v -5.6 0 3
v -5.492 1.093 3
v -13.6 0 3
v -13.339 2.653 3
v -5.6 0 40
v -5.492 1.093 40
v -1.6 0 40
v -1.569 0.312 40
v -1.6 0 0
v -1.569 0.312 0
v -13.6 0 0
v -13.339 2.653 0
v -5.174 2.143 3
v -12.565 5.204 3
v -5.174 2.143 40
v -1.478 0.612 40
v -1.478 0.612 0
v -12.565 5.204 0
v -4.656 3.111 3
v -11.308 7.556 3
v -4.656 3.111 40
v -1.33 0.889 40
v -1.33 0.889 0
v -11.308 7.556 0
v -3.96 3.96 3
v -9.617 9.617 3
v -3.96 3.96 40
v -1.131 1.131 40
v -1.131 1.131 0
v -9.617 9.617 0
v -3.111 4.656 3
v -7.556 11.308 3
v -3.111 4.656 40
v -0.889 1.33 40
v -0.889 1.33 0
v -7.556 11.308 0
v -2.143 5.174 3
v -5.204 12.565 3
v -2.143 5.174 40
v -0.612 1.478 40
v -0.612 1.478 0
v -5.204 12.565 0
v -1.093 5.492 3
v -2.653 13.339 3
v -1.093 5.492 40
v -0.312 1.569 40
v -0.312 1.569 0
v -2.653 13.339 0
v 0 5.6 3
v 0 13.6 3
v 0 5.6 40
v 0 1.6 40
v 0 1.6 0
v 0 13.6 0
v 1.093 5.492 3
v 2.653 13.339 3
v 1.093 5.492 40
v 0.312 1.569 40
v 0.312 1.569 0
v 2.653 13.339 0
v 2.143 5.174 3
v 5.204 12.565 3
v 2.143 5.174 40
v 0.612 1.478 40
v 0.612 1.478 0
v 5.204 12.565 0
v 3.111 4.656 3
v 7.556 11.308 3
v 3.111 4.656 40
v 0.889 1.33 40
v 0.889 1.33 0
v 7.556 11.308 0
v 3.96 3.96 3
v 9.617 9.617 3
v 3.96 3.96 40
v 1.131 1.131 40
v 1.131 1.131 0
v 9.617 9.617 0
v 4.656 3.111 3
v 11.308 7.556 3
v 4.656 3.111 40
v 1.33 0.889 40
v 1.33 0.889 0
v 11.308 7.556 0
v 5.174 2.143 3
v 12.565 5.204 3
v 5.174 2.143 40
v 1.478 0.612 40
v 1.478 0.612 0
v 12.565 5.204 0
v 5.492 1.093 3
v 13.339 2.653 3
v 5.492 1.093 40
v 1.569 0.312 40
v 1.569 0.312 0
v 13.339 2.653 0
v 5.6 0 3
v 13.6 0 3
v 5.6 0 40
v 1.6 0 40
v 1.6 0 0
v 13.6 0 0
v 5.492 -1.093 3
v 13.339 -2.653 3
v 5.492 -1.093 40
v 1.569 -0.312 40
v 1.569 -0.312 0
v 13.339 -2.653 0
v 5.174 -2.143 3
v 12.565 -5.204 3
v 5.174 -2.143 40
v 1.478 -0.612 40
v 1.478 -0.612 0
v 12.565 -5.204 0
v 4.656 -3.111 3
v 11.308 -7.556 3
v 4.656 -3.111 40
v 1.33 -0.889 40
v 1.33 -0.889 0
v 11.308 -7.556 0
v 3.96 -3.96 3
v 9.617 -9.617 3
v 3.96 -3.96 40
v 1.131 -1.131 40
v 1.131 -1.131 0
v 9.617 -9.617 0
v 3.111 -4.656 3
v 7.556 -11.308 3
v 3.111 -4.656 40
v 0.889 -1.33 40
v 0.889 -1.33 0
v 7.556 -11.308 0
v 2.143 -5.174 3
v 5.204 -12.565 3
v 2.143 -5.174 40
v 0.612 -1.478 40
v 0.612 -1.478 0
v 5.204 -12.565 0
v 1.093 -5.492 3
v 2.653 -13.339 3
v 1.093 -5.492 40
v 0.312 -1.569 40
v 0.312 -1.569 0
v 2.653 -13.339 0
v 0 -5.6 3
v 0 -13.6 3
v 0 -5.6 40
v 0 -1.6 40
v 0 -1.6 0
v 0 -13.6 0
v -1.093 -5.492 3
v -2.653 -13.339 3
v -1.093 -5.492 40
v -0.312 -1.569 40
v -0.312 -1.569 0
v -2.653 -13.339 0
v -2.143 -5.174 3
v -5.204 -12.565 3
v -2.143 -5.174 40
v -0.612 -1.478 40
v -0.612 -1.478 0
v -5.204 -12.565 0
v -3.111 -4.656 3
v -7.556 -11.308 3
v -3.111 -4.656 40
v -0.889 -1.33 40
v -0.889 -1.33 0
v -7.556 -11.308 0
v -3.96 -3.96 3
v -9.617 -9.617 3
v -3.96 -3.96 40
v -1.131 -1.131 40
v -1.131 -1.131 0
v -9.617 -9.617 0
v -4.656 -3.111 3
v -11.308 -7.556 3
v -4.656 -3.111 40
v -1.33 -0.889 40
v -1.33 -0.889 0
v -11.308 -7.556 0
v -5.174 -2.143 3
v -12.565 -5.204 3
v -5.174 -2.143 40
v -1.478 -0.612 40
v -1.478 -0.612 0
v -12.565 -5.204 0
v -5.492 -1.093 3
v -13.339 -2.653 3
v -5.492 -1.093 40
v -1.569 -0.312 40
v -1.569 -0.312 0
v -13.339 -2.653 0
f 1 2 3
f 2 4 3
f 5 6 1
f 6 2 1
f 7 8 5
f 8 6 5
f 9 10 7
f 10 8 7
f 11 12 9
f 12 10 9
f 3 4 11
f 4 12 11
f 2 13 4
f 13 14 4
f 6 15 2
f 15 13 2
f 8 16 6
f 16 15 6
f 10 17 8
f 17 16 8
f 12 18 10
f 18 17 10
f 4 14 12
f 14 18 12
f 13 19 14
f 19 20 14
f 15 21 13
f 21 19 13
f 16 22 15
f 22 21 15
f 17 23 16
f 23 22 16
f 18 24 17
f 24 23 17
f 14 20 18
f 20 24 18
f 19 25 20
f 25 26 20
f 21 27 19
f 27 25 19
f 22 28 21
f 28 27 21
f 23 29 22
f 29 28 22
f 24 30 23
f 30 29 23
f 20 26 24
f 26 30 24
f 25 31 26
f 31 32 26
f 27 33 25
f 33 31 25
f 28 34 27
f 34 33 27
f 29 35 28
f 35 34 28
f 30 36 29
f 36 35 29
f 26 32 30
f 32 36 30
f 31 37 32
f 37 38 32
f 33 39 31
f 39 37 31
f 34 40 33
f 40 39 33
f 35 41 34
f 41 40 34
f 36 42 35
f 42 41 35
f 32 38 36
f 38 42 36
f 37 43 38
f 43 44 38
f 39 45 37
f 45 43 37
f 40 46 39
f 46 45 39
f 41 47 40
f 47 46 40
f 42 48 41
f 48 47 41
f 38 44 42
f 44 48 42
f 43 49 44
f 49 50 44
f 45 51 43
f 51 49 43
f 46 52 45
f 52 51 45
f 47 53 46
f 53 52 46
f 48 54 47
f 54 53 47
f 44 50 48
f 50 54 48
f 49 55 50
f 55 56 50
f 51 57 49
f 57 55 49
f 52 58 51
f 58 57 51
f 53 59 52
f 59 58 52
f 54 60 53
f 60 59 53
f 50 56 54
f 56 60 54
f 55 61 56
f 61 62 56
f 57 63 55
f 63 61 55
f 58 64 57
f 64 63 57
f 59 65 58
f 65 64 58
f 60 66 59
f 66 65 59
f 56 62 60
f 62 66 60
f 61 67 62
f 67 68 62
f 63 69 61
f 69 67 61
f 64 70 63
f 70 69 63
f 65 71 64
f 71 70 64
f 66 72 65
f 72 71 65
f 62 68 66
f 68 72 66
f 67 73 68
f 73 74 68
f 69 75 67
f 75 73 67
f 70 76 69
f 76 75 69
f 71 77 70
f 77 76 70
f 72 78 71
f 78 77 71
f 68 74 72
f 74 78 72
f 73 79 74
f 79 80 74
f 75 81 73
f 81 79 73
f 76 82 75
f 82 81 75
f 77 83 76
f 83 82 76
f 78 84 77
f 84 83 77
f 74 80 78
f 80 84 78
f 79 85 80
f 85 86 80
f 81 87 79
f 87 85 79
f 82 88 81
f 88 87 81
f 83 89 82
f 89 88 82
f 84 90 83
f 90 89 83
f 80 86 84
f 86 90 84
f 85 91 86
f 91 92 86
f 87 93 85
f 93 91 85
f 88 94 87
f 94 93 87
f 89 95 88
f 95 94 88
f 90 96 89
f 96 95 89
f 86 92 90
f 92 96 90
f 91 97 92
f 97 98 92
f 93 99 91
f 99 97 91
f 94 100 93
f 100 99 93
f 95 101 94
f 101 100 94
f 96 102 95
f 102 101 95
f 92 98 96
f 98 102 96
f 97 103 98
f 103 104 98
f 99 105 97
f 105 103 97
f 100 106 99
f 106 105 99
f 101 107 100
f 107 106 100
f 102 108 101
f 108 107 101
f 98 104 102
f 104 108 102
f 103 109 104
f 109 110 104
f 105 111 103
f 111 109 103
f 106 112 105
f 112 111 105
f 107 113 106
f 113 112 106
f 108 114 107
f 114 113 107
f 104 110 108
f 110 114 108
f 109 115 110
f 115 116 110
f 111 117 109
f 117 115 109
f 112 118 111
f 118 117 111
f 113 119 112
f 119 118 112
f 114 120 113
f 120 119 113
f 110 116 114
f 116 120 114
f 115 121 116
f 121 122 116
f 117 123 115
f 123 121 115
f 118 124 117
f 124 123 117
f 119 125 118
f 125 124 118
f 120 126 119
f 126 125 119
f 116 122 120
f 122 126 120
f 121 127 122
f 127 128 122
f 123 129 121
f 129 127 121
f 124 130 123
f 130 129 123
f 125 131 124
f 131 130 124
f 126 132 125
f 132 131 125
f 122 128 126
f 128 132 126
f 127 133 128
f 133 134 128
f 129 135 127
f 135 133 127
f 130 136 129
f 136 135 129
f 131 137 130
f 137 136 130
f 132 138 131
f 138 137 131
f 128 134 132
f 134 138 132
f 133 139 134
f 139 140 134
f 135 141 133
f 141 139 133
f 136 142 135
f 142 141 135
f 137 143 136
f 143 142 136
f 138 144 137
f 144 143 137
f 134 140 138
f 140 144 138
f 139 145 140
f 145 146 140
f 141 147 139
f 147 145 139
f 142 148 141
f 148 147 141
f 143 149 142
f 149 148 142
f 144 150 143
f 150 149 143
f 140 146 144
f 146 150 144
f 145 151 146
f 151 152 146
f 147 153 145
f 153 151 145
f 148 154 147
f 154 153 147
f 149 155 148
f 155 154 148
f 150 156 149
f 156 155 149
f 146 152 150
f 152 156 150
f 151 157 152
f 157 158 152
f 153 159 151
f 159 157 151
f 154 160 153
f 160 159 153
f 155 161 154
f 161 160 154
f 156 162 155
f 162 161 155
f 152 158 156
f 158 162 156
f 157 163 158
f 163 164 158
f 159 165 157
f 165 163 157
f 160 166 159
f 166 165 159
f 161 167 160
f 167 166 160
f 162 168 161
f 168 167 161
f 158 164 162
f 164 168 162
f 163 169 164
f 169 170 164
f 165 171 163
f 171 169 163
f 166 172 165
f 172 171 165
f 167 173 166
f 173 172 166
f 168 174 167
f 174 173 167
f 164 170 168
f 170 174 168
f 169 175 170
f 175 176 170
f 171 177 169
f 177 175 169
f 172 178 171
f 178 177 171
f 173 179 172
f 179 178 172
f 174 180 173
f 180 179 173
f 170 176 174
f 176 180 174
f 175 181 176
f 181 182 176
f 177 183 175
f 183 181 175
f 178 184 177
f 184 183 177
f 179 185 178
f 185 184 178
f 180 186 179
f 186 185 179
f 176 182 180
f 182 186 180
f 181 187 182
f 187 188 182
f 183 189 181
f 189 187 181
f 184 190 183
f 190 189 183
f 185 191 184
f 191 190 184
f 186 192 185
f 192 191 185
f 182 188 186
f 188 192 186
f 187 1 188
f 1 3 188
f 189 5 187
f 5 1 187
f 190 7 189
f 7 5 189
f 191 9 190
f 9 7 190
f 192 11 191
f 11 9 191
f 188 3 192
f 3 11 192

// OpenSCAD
$fn = 32;

// ----------------------------------------------------------------------
// Profiled standoff: flanged spacer, 40 mm long, bore 3.2 mm
// ----------------------------------------------------------------------

// --- parameters (mm) ---
revolve_angle = 360;      // full turn around the Z axis
profile_points = 6;       // points of the closed outline

profile = [[1.6, 0], [13.6, 0], [13.6, 3], [5.6, 3], [5.6, 40], [1.6, 40]];  // single closed polygon, 6 points, counter clockwise

// --- the one profile operation ---
rotate_extrude(angle = revolve_angle) polygon(points = profile);
